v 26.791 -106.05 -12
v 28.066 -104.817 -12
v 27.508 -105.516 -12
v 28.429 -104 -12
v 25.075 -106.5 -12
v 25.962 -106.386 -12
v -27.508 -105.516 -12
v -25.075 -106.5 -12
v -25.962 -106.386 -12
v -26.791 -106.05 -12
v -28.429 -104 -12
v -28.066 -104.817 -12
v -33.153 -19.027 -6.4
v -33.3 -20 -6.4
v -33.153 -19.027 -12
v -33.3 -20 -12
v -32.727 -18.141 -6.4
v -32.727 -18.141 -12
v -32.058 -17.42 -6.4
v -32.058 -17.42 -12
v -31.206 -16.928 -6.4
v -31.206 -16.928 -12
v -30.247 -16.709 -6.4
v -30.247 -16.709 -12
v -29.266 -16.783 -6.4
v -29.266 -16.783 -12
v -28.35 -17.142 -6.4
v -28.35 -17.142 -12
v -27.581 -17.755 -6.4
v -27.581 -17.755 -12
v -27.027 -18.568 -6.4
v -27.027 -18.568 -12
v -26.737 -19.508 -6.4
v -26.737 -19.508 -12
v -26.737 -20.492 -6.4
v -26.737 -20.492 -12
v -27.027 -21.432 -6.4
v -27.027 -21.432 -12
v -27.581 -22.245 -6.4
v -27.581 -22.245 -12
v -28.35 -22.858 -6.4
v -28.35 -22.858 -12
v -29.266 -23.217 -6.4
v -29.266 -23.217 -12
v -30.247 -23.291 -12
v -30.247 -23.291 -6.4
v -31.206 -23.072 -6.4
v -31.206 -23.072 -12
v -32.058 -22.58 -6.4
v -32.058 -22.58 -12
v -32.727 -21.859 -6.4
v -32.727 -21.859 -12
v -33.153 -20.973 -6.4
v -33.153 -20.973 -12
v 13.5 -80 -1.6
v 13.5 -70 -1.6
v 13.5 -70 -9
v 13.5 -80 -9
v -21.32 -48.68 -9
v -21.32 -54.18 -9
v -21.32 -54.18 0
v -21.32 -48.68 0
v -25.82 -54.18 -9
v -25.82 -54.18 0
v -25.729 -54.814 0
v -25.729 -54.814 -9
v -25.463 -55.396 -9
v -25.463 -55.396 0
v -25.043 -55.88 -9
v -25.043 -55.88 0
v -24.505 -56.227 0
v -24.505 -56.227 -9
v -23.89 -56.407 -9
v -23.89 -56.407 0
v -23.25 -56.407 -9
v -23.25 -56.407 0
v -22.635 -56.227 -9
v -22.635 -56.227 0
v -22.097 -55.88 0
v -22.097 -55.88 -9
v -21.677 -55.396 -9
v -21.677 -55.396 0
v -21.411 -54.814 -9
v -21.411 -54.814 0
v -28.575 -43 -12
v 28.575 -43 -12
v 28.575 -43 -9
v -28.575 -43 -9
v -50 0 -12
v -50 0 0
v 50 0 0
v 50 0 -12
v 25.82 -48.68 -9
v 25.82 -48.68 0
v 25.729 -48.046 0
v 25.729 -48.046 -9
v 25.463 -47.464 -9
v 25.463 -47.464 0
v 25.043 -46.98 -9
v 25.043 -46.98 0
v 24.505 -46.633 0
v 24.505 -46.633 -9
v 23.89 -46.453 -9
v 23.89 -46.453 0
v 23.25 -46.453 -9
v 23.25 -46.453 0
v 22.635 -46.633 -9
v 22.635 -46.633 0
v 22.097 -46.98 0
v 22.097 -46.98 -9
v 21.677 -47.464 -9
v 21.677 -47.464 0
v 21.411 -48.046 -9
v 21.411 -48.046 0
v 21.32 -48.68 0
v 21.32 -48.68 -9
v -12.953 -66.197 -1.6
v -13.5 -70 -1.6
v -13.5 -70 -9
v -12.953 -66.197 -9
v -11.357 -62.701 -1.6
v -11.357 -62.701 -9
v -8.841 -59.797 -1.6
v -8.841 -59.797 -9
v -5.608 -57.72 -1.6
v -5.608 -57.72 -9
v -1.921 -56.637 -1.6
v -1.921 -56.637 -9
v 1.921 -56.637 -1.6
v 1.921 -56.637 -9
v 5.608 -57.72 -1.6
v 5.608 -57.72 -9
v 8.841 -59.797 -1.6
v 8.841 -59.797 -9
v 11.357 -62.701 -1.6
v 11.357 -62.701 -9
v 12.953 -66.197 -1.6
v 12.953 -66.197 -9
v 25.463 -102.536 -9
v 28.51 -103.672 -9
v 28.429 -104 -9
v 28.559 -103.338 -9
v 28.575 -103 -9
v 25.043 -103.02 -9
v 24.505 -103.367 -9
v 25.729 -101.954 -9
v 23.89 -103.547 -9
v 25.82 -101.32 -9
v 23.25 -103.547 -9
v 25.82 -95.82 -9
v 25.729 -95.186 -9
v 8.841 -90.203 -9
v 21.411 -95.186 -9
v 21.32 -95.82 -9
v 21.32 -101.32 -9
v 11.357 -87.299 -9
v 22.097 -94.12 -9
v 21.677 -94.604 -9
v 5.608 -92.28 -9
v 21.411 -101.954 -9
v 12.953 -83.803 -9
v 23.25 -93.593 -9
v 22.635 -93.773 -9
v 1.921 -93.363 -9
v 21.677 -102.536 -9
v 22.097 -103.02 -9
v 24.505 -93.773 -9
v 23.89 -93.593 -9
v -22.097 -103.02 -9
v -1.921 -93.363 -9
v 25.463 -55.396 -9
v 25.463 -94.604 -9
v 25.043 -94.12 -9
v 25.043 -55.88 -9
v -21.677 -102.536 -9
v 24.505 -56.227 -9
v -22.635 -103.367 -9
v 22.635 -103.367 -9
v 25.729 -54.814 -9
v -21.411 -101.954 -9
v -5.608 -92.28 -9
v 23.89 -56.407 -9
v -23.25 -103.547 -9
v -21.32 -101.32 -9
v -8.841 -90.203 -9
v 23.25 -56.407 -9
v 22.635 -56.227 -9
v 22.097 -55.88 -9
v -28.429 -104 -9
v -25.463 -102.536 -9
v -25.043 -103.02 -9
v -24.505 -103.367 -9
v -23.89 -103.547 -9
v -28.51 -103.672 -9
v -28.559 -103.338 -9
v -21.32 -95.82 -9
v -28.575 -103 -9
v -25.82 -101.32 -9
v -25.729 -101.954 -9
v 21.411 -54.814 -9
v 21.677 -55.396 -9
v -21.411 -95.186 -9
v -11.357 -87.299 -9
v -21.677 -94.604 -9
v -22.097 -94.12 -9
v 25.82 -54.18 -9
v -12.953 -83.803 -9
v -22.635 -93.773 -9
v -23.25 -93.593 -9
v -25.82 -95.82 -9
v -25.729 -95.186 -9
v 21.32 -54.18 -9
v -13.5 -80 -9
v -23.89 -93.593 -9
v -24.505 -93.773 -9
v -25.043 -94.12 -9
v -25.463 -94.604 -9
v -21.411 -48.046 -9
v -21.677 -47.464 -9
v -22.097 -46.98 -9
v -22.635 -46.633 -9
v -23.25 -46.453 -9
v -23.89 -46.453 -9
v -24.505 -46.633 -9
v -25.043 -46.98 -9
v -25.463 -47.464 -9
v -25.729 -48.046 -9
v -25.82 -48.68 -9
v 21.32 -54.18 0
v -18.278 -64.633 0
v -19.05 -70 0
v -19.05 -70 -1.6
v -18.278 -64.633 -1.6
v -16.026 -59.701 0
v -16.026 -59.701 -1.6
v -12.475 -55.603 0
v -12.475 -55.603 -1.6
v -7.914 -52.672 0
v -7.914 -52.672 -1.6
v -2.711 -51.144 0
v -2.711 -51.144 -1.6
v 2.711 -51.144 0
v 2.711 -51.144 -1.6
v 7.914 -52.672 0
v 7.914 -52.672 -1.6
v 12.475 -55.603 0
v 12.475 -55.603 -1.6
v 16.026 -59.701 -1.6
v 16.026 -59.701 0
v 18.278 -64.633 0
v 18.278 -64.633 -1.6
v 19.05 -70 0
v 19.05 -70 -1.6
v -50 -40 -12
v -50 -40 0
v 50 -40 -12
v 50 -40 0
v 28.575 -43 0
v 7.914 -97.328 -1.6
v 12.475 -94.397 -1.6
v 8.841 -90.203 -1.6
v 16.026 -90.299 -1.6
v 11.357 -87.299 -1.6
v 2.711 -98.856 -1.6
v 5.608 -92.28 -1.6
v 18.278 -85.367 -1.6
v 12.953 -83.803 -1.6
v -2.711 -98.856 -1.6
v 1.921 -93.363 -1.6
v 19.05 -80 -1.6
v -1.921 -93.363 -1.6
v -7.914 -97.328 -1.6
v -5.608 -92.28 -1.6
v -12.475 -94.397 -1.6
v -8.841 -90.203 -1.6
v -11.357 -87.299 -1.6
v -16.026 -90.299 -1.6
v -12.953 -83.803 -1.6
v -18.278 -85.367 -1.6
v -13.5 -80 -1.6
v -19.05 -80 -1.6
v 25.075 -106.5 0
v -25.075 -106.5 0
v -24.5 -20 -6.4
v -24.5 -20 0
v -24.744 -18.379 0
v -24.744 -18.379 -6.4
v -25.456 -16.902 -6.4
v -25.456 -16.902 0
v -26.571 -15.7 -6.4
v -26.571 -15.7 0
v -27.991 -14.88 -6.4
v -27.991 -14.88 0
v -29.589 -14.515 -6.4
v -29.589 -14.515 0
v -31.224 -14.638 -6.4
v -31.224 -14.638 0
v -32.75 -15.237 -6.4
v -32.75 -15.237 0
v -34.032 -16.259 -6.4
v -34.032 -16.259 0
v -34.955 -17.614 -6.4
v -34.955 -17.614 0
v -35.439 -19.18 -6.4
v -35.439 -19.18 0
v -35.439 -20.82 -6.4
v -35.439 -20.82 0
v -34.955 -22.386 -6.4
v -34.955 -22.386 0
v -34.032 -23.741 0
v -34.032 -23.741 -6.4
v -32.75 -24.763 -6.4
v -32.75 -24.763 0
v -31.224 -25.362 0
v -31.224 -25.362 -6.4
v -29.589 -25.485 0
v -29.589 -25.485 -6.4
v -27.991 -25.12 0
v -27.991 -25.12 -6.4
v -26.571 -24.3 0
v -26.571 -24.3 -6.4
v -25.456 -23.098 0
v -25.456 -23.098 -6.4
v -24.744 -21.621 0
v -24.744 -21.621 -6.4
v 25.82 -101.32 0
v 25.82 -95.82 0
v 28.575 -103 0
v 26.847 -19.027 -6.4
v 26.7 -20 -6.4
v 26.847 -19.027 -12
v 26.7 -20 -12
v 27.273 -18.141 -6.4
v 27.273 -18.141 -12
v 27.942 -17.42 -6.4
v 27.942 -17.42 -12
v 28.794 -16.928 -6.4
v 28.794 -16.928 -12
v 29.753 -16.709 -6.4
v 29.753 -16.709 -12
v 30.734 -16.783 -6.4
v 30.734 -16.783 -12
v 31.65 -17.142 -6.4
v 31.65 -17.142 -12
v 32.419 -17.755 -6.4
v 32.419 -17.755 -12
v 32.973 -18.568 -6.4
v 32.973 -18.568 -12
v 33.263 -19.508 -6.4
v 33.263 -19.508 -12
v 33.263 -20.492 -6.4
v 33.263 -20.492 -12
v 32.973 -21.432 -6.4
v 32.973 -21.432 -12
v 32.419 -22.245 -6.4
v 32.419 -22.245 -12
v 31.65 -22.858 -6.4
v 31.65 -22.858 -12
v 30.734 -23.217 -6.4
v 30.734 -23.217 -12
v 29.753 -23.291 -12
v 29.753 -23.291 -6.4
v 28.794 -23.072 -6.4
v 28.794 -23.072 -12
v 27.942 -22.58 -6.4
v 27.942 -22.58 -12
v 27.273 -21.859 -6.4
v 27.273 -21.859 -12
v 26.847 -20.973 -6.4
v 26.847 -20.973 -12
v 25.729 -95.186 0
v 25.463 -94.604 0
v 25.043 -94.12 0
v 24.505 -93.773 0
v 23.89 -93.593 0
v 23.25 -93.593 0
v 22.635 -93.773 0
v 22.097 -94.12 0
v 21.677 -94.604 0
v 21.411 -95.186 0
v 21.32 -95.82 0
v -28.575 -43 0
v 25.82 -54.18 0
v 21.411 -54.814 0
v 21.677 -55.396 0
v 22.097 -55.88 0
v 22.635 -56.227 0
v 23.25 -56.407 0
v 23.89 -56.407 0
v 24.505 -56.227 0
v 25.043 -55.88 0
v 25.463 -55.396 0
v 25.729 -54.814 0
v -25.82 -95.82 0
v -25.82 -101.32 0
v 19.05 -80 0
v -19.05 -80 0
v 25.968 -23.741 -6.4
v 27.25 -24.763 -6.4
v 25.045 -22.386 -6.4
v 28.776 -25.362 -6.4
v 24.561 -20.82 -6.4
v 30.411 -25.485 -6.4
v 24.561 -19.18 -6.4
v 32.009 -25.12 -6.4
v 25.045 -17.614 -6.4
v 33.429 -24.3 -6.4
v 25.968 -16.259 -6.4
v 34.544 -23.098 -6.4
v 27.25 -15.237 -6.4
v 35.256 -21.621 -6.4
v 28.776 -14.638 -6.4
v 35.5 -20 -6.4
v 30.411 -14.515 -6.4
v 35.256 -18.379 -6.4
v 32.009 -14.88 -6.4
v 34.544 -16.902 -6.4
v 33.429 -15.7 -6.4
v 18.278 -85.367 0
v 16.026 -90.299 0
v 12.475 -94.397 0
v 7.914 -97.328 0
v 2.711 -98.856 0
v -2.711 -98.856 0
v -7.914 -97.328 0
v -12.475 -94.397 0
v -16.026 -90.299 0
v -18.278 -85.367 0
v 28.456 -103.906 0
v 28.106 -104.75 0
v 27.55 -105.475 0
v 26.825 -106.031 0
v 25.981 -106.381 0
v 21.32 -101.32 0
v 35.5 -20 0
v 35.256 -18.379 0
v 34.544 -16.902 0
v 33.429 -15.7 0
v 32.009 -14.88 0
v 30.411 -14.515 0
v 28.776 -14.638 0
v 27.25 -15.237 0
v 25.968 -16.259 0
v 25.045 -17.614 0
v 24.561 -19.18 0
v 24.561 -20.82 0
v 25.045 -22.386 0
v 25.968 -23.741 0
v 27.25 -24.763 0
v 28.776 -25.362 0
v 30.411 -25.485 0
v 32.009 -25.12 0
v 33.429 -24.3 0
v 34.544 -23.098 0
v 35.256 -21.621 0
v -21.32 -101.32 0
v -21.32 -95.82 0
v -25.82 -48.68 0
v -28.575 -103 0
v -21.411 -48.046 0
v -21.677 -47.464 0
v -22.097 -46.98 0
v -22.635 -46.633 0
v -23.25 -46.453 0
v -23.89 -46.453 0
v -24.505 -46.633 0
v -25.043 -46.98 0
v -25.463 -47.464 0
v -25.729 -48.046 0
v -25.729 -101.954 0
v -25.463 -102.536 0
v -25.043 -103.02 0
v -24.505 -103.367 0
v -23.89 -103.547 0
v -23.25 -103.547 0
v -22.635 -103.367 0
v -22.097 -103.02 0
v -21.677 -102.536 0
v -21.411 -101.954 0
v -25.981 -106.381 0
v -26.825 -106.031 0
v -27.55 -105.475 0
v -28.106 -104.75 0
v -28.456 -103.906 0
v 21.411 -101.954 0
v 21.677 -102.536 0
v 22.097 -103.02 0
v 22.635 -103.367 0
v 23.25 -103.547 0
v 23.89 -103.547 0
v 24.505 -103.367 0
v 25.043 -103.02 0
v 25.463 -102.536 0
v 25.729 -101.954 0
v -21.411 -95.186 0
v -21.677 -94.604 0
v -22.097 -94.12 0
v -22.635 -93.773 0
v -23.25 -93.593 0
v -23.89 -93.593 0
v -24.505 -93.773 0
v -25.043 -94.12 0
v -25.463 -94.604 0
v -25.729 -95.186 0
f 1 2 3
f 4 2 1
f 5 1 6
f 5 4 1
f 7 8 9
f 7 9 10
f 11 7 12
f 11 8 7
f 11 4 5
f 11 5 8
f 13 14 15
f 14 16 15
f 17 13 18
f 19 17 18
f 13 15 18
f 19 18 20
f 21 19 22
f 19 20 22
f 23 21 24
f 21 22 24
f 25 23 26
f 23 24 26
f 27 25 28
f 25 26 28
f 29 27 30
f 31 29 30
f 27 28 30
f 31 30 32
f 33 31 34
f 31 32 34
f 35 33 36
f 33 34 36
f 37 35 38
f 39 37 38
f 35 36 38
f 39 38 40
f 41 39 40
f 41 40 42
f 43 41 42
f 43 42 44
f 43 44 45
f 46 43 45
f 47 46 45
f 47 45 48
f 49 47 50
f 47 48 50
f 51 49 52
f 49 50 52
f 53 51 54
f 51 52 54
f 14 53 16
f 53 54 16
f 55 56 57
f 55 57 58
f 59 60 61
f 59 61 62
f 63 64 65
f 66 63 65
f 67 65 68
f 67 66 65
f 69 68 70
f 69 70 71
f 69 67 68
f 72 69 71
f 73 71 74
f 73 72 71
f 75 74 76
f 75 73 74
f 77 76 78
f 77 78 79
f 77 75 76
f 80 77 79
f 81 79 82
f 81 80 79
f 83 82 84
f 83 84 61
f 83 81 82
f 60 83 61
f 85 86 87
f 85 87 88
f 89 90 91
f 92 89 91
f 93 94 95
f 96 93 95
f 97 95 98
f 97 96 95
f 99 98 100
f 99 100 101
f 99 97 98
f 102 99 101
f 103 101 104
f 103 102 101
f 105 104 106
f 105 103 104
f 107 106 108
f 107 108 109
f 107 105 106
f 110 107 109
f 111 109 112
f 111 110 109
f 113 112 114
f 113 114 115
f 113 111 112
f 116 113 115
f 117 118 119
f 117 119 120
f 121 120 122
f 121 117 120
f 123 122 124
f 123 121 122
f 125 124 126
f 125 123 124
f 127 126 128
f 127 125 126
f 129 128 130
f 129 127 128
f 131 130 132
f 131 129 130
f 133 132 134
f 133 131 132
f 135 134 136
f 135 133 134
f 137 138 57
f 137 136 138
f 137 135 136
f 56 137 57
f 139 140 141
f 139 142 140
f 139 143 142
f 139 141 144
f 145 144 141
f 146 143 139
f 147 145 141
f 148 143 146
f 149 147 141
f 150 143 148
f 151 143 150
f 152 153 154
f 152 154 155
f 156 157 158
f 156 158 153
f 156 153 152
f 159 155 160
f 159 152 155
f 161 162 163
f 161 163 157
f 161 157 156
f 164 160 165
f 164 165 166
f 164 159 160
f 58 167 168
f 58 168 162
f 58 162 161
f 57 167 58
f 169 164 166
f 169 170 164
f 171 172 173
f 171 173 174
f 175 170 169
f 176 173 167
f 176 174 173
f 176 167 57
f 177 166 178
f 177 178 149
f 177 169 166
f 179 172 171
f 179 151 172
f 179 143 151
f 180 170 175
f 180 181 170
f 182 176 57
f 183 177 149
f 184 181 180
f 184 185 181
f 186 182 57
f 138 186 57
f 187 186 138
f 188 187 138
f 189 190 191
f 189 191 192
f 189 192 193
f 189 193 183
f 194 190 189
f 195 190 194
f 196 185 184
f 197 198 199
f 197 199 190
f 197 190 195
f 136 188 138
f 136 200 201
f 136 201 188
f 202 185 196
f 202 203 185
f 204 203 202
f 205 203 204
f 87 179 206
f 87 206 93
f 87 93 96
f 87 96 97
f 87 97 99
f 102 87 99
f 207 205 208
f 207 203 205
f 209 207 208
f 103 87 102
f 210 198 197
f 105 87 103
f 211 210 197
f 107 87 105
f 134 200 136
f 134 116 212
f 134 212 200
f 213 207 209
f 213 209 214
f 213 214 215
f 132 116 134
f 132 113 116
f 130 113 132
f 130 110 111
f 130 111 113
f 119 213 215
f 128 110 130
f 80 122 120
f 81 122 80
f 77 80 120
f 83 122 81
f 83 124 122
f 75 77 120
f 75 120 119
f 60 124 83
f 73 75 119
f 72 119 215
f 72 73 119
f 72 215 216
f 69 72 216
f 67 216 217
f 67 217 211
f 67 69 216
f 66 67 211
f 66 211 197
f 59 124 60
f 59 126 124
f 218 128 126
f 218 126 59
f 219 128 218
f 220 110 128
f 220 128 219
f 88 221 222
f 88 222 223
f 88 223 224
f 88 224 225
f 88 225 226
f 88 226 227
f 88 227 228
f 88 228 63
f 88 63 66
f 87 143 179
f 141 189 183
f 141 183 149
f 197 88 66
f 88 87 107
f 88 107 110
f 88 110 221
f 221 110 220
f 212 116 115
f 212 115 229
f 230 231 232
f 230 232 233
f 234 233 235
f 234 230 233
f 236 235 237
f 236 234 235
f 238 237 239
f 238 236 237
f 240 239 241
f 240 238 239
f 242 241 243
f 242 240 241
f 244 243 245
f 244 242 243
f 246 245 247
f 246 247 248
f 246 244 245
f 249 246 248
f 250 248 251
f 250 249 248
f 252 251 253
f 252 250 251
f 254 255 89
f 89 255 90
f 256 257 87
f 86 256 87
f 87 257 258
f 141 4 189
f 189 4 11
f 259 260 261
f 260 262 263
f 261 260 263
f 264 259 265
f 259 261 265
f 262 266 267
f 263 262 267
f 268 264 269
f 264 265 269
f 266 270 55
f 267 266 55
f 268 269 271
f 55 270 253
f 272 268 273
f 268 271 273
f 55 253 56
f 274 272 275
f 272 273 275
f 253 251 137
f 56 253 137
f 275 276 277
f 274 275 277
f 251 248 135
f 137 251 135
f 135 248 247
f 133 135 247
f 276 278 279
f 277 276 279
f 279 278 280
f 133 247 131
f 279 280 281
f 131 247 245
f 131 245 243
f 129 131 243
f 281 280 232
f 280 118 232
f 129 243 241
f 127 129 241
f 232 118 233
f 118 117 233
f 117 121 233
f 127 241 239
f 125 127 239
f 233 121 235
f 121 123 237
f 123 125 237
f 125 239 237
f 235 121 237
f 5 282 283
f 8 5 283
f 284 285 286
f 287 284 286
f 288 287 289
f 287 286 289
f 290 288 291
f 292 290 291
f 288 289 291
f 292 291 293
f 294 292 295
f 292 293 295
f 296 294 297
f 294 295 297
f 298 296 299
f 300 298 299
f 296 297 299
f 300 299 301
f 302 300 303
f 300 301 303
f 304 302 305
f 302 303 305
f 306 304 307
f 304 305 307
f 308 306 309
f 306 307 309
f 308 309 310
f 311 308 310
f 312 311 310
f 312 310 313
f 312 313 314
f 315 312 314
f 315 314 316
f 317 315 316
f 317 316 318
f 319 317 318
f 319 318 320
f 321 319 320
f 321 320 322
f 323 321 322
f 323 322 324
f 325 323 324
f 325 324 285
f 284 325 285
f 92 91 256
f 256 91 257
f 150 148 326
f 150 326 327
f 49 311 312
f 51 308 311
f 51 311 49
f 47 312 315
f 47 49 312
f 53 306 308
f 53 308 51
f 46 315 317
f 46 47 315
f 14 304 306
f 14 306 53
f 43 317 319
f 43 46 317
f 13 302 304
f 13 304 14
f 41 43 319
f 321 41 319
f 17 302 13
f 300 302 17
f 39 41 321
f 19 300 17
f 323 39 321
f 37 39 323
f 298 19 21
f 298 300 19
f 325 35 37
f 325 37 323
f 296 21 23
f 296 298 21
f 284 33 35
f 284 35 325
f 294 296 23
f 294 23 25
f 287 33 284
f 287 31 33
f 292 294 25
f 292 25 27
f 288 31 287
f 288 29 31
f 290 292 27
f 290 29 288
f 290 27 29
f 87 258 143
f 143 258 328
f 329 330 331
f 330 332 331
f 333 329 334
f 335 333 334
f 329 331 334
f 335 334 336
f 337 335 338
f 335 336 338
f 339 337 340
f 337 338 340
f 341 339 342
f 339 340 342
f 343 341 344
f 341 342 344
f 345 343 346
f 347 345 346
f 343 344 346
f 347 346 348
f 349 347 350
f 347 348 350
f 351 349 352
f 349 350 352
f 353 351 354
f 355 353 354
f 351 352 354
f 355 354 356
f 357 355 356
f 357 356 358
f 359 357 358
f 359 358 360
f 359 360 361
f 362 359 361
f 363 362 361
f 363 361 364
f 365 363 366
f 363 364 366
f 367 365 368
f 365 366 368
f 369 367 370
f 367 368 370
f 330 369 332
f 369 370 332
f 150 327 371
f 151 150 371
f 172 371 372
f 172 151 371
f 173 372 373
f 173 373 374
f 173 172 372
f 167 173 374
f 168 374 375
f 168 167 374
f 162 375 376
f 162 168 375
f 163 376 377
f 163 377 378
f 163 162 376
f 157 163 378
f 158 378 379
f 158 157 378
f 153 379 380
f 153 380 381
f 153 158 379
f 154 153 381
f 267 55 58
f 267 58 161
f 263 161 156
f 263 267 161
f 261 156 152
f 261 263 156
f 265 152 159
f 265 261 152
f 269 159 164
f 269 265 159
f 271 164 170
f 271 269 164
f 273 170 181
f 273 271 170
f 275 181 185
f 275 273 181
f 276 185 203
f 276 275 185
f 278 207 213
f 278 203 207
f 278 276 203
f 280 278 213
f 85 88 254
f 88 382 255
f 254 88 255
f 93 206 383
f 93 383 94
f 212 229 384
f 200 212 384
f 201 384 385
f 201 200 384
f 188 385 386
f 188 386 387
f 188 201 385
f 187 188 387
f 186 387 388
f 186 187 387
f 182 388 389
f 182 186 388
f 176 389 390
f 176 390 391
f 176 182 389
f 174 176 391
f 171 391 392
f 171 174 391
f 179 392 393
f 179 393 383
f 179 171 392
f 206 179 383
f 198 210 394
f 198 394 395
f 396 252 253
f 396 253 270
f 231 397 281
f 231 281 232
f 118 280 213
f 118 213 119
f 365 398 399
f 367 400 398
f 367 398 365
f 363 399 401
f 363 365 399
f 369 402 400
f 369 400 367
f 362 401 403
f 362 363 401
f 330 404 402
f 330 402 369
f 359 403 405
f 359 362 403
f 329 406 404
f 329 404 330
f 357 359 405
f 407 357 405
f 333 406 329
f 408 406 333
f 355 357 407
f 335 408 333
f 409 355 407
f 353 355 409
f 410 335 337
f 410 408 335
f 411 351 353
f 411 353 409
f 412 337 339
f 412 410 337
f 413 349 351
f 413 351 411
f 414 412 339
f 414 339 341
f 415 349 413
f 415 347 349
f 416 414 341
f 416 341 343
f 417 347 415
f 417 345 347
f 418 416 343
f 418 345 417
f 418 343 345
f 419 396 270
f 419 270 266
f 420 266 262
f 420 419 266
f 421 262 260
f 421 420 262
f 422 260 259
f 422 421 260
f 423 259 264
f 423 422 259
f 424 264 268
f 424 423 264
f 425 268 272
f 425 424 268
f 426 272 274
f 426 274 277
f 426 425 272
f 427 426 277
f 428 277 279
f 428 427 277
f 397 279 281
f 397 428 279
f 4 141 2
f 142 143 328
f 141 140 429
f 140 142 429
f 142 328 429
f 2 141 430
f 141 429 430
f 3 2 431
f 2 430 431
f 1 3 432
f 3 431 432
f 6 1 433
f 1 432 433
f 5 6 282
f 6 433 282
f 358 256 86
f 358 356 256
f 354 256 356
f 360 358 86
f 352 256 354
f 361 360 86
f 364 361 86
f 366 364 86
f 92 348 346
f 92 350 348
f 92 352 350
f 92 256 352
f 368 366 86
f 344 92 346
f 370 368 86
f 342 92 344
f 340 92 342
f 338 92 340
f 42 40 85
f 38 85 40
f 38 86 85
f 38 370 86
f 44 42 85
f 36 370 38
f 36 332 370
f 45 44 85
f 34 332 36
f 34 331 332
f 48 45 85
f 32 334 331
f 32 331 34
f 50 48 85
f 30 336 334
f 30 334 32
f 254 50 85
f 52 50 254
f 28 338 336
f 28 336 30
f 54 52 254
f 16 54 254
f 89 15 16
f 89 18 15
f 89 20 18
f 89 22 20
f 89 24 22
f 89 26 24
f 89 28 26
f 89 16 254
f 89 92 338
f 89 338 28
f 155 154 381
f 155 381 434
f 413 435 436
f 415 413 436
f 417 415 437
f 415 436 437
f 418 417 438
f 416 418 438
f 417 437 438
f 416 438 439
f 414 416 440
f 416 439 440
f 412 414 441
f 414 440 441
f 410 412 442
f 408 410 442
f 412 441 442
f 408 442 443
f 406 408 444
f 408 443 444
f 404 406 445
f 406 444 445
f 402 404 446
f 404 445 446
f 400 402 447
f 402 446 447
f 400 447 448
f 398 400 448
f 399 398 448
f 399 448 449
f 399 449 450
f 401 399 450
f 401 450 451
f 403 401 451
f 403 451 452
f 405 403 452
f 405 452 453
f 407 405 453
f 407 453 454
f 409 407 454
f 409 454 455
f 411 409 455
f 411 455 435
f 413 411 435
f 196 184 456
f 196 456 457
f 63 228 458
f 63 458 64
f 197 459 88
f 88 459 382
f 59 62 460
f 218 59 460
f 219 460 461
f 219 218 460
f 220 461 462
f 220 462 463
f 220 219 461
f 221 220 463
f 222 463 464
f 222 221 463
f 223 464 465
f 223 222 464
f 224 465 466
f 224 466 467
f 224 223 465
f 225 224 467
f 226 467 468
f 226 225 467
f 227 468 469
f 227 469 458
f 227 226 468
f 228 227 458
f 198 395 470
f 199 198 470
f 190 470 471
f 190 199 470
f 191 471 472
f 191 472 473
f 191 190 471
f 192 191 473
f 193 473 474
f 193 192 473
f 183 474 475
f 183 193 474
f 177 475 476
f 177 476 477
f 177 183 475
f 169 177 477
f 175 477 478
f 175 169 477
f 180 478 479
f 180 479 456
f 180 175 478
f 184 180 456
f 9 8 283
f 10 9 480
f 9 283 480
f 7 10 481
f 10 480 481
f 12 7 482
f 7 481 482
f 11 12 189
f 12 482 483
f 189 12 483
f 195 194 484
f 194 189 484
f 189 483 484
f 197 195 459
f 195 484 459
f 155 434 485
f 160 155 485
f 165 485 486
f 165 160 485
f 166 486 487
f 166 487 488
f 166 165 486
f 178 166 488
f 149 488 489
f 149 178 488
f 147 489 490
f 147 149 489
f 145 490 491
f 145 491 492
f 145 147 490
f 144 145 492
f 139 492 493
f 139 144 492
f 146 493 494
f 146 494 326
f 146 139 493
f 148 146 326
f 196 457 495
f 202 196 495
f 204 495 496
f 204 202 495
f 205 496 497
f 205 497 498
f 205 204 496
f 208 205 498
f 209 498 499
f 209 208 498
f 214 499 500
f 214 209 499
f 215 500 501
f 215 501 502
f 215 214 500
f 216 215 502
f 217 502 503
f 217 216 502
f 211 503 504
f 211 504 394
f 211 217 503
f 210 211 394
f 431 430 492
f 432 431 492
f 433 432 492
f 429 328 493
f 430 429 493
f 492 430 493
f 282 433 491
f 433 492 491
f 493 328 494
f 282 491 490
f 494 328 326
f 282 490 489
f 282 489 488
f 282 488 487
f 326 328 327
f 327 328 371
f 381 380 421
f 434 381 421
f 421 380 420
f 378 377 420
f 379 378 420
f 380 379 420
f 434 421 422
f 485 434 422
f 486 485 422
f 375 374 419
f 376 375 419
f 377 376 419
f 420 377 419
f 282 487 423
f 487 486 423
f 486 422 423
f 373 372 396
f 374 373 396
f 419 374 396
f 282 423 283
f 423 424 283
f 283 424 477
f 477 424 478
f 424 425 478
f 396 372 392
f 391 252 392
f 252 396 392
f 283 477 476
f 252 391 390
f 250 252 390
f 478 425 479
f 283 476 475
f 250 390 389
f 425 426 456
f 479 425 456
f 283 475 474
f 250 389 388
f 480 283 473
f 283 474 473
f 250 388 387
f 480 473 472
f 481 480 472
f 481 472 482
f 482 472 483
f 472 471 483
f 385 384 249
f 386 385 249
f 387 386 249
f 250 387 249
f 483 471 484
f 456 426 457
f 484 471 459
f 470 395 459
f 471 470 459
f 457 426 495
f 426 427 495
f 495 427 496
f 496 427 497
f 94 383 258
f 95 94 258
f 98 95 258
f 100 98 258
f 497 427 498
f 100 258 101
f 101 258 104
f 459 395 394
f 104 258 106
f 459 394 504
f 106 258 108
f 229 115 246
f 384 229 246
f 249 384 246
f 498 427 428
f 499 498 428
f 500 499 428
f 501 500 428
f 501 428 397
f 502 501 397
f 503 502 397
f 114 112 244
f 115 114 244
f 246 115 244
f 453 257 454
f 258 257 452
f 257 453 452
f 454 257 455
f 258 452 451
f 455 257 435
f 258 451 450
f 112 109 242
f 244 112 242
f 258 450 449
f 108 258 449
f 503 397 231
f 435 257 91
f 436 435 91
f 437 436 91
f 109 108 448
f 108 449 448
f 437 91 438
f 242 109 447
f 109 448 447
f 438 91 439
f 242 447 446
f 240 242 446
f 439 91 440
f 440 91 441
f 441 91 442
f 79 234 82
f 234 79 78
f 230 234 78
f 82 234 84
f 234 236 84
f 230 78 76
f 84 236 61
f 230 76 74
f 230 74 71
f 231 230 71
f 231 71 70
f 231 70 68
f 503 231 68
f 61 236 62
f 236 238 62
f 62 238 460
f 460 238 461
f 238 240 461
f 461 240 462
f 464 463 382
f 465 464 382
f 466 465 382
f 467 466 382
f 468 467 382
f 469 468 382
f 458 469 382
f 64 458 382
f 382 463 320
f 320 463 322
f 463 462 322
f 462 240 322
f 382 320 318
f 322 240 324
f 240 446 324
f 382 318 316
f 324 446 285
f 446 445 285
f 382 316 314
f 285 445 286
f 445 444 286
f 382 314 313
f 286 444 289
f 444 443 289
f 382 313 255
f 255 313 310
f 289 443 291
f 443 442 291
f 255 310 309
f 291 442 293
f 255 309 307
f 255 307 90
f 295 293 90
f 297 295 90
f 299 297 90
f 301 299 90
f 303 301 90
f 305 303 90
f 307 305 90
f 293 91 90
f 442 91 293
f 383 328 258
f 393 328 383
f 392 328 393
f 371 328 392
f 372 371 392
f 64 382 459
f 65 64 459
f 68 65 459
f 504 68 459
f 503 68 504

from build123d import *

# Parameters (mm, degrees)
EXTRUDE_1_DEPTH             = 12
HOLE_WIZARD_M61_D           = 6.6
HOLE_WIZARD_M61_CBORE_D     = 11
HOLE_WIZARD_M61_CBORE_DEPTH = 6.4
SKETCH_4_W                  = 57.15
SKETCH_4_H                  = 61
CUT_EXTRUDE_1_DEPTH         = 3
CUT_EXTRUDE_2_DEPTH         = 1.6
CUT_EXTRUDE_3_DEPTH         = 119.111853766
HOLE_START                  = -9
HOLE_WIZARD_M42_DEPTH       = 9


# Read off the part's stored shape, not the designer's step: Прорезь с зазором M42
with BuildPart() as part:
    # Эскиз1 → Бобышка-Вытянуть1 (new body)
    with BuildSketch(Plane.XY):
        with BuildLine():
            Line((-50, 0), (50, 0))
            Line((50, 0), (50, -40))
            Line((50, -40), (28.575, -43))
            Line((28.575, -43), (28.575, -103))
            ThreePointArc((28.575, -103), (27.549873734, -105.474873734), (25.075, -106.5))
            Line((25.075, -106.5), (-25.075, -106.5))
            ThreePointArc((-25.075, -106.5), (-27.549873734, -105.474873734), (-28.575, -103))
            Line((-28.575, -103), (-28.575, -43))
            Line((-28.575, -43), (-50, -40))
            Line((-50, -40), (-50, 0))
        make_face()
    extrude(amount=-EXTRUDE_1_DEPTH)

    # Цековка для  винта с внутренним шестигранником M61 (through all)
    with Locations(Plane.XY):
        with Locations((-30, -20), (30, -20)):
            CounterBoreHole(HOLE_WIZARD_M61_D / 2, HOLE_WIZARD_M61_CBORE_D / 2, HOLE_WIZARD_M61_CBORE_DEPTH)

    # Эскиз4 → Вырез-Вытянуть1 (cut)
    with BuildSketch(Plane(origin=(0, 0, -12), x_dir=(-1, 0, 0), z_dir=(0, 0, -1))):
        with Locations((0, -73.5)):
            Rectangle(SKETCH_4_W, SKETCH_4_H)
    extrude(amount=-CUT_EXTRUDE_1_DEPTH, mode=Mode.SUBTRACT)

    # Эскиз12 → Вырез-Вытянуть2 (cut)
    with BuildSketch(Plane.XY):
        with BuildLine():
            Line((-19.05, -80), (-19.05, -70))
            ThreePointArc((-19.05, -70), (0, -50.95), (19.05, -70))
            Line((19.05, -70), (19.05, -80))
            ThreePointArc((19.05, -80), (0, -99.05), (-19.05, -80))
        make_face()
    extrude(amount=-CUT_EXTRUDE_2_DEPTH, mode=Mode.SUBTRACT)

    # Эскиз13 → Вырез-Вытянуть3 (cut, through all)
    with BuildSketch(Plane.XY.offset(-1.6)):
        with BuildLine():
            Line((-13.5, -80), (-13.5, -70))
            ThreePointArc((-13.5, -70), (0, -56.5), (13.5, -70))
            Line((13.5, -70), (13.5, -80))
            ThreePointArc((13.5, -80), (0, -93.5), (-13.5, -80))
        make_face()
    extrude(amount=-CUT_EXTRUDE_3_DEPTH, mode=Mode.SUBTRACT)

    # Прорезь с зазором M42 outline → Прорезь с зазором M42 (cut)
    with BuildSketch(Plane.XY.offset(HOLE_START)):
        with BuildLine():
            ThreePointArc((-21.32, -95.82), (-23.57, -93.57), (-25.82, -95.82))
            Line((-25.82, -95.82), (-25.82, -101.32))
            ThreePointArc((-25.82, -101.32), (-23.57, -103.57), (-21.32, -101.32))
            Line((-21.32, -101.32), (-21.32, -95.82))
        make_face()
        with BuildLine():
            ThreePointArc((-21.32, -48.68), (-23.57, -46.43), (-25.82, -48.68))
            Line((-25.82, -48.68), (-25.82, -54.18))
            ThreePointArc((-25.82, -54.18), (-23.57, -56.43), (-21.32, -54.18))
            Line((-21.32, -54.18), (-21.32, -48.68))
        make_face()
        with BuildLine():
            ThreePointArc((25.82, -95.82), (23.57, -93.57), (21.32, -95.82))
            Line((21.32, -95.82), (21.32, -101.32))
            ThreePointArc((21.32, -101.32), (23.57, -103.57), (25.82, -101.32))
            Line((25.82, -101.32), (25.82, -95.82))
        make_face()
        with BuildLine():
            ThreePointArc((25.82, -48.68), (23.57, -46.43), (21.32, -48.68))
            Line((21.32, -48.68), (21.32, -54.18))
            ThreePointArc((21.32, -54.18), (23.57, -56.43), (25.82, -54.18))
            Line((25.82, -54.18), (25.82, -48.68))
        make_face()
    extrude(amount=HOLE_WIZARD_M42_DEPTH, mode=Mode.SUBTRACT)


solid = part.part
